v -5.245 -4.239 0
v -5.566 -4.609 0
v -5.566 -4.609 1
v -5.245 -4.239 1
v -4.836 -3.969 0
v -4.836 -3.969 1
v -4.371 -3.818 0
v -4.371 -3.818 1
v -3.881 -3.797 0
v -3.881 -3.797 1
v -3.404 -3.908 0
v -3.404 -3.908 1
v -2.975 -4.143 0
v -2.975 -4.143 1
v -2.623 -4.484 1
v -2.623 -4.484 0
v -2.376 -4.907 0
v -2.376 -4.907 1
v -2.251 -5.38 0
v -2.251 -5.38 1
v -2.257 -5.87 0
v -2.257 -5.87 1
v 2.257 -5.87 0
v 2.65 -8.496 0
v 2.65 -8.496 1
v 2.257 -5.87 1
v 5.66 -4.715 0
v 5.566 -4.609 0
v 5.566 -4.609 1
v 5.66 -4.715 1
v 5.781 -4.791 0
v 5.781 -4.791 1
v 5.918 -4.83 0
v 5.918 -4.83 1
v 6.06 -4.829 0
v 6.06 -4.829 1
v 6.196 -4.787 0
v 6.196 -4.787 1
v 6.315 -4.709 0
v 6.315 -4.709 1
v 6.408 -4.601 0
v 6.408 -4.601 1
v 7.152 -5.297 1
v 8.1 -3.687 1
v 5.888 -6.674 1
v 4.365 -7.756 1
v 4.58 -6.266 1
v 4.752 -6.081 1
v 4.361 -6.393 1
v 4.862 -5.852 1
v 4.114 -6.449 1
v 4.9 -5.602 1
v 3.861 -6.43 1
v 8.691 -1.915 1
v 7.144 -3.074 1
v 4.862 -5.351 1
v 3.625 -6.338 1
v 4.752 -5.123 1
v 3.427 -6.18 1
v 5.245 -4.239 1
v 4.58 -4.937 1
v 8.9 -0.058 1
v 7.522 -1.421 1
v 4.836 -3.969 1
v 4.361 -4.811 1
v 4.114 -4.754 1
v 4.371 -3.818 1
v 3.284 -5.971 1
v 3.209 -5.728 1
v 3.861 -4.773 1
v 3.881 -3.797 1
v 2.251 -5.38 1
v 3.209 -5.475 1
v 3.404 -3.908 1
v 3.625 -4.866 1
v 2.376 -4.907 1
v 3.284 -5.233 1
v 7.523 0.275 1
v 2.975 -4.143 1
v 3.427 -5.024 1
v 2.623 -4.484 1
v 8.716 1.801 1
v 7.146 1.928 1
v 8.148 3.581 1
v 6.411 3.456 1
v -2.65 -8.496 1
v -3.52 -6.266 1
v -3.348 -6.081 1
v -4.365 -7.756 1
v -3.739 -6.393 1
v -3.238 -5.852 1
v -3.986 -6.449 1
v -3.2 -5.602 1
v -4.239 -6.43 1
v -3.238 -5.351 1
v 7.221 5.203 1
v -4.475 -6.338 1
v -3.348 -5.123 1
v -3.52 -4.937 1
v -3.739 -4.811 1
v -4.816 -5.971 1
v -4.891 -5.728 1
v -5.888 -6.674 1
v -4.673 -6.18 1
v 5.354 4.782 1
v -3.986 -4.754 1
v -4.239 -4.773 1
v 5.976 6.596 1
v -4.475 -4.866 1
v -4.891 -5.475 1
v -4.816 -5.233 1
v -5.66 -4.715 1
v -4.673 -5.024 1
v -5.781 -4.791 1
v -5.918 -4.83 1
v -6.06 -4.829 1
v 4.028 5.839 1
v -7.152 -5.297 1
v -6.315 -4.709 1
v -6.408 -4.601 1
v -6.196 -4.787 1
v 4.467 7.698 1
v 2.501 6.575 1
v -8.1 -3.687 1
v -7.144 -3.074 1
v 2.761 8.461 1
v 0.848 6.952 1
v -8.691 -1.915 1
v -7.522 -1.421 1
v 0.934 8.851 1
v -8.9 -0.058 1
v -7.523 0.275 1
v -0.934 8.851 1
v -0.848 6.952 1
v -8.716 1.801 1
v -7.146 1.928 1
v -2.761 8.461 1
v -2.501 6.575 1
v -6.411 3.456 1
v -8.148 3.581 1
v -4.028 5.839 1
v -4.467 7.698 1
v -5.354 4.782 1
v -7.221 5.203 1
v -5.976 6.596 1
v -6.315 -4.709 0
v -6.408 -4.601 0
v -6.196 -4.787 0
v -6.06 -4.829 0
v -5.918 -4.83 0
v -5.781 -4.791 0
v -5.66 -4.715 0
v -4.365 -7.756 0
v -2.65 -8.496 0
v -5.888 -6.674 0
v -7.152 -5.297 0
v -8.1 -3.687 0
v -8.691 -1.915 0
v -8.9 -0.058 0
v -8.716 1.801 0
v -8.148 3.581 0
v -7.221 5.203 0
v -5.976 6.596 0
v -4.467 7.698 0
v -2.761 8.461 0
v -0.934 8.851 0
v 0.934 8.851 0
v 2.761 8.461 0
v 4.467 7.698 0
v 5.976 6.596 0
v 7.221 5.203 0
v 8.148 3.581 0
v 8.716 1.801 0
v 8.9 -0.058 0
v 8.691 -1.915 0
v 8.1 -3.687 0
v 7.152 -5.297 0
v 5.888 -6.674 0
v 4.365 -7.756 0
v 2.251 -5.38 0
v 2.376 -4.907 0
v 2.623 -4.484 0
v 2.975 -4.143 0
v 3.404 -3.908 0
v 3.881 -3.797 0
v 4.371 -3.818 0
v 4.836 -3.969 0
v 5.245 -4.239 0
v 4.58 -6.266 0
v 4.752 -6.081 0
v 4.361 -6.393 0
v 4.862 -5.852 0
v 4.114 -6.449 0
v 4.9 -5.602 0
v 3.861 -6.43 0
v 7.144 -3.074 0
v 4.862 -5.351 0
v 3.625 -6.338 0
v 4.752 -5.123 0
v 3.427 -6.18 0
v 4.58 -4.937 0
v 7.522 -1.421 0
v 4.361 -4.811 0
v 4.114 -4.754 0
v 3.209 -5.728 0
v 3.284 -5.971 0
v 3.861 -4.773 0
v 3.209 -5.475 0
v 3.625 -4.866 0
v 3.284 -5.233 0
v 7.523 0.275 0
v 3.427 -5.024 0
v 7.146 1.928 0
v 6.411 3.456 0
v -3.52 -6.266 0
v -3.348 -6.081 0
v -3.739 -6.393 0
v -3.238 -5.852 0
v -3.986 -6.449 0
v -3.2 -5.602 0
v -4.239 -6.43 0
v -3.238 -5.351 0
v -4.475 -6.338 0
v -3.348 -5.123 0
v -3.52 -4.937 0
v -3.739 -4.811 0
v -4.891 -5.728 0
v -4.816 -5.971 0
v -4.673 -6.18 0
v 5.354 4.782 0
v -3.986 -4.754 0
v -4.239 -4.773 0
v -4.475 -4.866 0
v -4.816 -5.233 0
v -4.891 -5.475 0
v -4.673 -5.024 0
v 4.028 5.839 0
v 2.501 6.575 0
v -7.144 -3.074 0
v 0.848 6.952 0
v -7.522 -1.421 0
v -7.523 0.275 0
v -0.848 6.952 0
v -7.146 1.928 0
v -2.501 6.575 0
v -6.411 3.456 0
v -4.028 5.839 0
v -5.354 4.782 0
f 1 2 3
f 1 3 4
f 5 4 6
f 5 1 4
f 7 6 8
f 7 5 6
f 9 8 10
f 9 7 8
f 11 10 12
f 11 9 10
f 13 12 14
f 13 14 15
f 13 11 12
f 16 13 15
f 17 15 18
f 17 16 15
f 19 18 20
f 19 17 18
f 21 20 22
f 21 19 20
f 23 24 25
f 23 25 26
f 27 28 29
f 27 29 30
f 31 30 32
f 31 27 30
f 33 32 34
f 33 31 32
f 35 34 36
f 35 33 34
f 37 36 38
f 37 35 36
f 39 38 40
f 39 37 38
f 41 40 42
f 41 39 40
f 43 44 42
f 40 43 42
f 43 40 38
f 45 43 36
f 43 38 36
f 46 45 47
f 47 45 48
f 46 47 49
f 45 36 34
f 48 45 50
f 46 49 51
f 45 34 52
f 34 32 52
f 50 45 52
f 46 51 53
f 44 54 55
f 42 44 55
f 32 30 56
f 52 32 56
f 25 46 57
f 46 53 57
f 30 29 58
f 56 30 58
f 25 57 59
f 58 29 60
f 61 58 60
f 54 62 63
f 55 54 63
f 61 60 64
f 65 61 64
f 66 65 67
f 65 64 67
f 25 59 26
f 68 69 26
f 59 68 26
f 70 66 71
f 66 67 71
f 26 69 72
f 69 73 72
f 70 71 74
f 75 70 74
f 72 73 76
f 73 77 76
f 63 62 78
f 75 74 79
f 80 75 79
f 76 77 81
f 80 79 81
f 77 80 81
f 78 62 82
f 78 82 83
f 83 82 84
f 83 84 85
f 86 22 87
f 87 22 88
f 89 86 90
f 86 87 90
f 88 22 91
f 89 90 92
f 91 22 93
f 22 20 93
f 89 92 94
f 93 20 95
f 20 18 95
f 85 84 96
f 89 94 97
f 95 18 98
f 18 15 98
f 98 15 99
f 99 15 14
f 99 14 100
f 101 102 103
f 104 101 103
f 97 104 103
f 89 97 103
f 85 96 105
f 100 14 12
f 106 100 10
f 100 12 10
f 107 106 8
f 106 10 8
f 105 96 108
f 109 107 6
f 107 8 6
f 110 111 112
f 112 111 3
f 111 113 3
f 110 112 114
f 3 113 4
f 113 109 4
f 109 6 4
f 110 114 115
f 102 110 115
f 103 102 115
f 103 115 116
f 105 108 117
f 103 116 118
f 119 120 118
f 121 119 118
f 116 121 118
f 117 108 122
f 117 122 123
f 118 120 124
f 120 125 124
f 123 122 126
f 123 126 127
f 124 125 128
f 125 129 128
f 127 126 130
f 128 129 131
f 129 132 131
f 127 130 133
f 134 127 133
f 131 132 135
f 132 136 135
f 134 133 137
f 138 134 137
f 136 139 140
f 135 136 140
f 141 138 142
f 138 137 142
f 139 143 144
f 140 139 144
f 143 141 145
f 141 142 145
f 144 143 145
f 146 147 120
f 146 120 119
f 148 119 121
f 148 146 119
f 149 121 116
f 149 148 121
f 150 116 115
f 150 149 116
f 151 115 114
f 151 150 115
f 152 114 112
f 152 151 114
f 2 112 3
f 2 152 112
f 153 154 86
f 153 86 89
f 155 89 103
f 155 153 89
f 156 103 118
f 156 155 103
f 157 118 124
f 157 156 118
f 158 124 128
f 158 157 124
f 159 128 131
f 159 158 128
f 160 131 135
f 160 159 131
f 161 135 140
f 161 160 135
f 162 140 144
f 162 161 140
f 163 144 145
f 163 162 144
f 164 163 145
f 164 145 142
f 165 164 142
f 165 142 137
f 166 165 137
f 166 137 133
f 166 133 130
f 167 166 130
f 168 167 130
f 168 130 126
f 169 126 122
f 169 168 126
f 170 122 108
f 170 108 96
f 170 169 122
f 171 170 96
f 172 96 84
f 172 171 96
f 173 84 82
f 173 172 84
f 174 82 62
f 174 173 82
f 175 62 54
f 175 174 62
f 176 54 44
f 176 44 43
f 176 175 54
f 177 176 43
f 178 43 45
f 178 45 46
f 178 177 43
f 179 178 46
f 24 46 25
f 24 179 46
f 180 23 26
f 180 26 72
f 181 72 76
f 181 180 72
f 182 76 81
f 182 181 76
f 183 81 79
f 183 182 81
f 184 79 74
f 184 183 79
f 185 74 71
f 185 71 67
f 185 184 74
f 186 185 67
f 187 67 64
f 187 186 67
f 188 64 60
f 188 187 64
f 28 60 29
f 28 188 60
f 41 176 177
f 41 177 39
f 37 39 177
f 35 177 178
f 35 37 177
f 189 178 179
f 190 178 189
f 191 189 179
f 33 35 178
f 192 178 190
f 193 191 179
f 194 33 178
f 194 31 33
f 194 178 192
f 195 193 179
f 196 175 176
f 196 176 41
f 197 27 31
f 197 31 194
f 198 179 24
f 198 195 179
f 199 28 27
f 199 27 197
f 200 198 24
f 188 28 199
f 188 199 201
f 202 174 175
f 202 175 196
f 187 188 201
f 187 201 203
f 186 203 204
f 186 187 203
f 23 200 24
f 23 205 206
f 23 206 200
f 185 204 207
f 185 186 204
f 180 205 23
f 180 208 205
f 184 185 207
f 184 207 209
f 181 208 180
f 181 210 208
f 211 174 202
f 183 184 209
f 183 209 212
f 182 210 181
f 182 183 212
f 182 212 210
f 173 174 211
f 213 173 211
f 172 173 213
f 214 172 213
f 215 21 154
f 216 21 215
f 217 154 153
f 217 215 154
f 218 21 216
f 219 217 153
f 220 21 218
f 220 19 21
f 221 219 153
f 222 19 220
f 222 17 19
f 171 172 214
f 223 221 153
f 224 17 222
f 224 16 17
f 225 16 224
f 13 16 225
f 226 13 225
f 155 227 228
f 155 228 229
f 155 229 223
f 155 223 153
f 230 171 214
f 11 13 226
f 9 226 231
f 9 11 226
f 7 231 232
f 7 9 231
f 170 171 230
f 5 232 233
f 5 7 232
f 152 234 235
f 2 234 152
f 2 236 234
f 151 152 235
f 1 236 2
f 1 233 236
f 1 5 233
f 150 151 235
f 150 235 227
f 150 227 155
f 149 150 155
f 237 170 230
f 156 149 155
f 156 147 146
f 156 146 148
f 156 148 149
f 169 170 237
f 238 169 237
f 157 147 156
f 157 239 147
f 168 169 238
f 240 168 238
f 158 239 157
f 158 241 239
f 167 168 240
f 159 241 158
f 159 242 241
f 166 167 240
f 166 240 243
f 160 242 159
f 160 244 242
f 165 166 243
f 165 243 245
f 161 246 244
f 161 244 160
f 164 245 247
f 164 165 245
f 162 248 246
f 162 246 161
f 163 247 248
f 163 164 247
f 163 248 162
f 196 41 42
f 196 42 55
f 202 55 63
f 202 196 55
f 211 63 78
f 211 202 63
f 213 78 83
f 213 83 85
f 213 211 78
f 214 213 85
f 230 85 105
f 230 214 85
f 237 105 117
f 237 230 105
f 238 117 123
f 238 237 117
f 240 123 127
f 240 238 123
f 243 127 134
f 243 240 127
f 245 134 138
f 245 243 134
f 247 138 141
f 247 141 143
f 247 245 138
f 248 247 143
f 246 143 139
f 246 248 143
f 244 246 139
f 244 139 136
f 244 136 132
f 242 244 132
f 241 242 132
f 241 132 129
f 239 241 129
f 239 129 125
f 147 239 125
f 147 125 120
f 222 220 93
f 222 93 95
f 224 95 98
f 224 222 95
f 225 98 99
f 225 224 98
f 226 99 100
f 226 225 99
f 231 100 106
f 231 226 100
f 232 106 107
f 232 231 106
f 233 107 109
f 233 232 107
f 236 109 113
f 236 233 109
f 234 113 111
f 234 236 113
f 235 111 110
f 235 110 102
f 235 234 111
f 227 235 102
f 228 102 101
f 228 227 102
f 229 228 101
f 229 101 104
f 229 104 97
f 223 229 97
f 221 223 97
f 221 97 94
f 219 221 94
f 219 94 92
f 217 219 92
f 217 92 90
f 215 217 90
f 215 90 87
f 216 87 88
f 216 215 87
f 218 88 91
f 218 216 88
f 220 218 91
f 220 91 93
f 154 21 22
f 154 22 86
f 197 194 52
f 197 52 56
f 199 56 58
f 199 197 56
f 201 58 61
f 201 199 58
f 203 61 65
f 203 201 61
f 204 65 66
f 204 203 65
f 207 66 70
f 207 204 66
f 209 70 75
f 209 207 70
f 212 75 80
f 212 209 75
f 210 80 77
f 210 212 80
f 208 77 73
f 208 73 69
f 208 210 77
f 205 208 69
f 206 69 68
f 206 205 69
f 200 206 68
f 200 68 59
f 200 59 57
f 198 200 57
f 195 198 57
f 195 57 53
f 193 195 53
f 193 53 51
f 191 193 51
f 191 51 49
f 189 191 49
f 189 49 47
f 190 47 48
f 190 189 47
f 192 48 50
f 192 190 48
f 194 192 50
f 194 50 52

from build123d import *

# Parameters (mm, degrees)
SKETCH1_R           = 0.85
BOSS_EXTRUDE1_DEPTH = 1


with BuildPart() as part:
    # Sketch1 → Boss-Extrude1 (new body)
    with BuildSketch(Plane.XY):
        with BuildLine():
            Line((-2.257442204, -5.86965719), (-2.65, -8.496322734))
            ThreePointArc((-2.65, -8.496322734), (0, 8.9), (2.65, -8.496322734))
            Line((2.65, -8.496322734), (2.257442204, -5.86965719))
            ThreePointArc((2.257442204, -5.86965719), (3.404490458, -3.908136939), (5.56612419, -4.608580375))
            ThreePointArc((5.56612419, -4.608580375), (5.988976647, -4.834574135), (6.407596147, -4.600832621))
            ThreePointArc((6.407596147, -4.600832621), (0, 7), (-6.407596147, -4.600832621))
            ThreePointArc((-6.407596147, -4.600832621), (-5.988976647, -4.834574135), (-5.56612419, -4.608580375))
            ThreePointArc((-5.56612419, -4.608580375), (-3.404490458, -3.908136939), (-2.257442204, -5.86965719))
        make_face()
        with Locations((-4.05, -5.601757633)):
            Circle(SKETCH1_R, mode=Mode.SUBTRACT)
        with Locations((4.05, -5.601757633)):
            Circle(SKETCH1_R, mode=Mode.SUBTRACT)
    extrude(amount=BOSS_EXTRUDE1_DEPTH)


solid = part.part
